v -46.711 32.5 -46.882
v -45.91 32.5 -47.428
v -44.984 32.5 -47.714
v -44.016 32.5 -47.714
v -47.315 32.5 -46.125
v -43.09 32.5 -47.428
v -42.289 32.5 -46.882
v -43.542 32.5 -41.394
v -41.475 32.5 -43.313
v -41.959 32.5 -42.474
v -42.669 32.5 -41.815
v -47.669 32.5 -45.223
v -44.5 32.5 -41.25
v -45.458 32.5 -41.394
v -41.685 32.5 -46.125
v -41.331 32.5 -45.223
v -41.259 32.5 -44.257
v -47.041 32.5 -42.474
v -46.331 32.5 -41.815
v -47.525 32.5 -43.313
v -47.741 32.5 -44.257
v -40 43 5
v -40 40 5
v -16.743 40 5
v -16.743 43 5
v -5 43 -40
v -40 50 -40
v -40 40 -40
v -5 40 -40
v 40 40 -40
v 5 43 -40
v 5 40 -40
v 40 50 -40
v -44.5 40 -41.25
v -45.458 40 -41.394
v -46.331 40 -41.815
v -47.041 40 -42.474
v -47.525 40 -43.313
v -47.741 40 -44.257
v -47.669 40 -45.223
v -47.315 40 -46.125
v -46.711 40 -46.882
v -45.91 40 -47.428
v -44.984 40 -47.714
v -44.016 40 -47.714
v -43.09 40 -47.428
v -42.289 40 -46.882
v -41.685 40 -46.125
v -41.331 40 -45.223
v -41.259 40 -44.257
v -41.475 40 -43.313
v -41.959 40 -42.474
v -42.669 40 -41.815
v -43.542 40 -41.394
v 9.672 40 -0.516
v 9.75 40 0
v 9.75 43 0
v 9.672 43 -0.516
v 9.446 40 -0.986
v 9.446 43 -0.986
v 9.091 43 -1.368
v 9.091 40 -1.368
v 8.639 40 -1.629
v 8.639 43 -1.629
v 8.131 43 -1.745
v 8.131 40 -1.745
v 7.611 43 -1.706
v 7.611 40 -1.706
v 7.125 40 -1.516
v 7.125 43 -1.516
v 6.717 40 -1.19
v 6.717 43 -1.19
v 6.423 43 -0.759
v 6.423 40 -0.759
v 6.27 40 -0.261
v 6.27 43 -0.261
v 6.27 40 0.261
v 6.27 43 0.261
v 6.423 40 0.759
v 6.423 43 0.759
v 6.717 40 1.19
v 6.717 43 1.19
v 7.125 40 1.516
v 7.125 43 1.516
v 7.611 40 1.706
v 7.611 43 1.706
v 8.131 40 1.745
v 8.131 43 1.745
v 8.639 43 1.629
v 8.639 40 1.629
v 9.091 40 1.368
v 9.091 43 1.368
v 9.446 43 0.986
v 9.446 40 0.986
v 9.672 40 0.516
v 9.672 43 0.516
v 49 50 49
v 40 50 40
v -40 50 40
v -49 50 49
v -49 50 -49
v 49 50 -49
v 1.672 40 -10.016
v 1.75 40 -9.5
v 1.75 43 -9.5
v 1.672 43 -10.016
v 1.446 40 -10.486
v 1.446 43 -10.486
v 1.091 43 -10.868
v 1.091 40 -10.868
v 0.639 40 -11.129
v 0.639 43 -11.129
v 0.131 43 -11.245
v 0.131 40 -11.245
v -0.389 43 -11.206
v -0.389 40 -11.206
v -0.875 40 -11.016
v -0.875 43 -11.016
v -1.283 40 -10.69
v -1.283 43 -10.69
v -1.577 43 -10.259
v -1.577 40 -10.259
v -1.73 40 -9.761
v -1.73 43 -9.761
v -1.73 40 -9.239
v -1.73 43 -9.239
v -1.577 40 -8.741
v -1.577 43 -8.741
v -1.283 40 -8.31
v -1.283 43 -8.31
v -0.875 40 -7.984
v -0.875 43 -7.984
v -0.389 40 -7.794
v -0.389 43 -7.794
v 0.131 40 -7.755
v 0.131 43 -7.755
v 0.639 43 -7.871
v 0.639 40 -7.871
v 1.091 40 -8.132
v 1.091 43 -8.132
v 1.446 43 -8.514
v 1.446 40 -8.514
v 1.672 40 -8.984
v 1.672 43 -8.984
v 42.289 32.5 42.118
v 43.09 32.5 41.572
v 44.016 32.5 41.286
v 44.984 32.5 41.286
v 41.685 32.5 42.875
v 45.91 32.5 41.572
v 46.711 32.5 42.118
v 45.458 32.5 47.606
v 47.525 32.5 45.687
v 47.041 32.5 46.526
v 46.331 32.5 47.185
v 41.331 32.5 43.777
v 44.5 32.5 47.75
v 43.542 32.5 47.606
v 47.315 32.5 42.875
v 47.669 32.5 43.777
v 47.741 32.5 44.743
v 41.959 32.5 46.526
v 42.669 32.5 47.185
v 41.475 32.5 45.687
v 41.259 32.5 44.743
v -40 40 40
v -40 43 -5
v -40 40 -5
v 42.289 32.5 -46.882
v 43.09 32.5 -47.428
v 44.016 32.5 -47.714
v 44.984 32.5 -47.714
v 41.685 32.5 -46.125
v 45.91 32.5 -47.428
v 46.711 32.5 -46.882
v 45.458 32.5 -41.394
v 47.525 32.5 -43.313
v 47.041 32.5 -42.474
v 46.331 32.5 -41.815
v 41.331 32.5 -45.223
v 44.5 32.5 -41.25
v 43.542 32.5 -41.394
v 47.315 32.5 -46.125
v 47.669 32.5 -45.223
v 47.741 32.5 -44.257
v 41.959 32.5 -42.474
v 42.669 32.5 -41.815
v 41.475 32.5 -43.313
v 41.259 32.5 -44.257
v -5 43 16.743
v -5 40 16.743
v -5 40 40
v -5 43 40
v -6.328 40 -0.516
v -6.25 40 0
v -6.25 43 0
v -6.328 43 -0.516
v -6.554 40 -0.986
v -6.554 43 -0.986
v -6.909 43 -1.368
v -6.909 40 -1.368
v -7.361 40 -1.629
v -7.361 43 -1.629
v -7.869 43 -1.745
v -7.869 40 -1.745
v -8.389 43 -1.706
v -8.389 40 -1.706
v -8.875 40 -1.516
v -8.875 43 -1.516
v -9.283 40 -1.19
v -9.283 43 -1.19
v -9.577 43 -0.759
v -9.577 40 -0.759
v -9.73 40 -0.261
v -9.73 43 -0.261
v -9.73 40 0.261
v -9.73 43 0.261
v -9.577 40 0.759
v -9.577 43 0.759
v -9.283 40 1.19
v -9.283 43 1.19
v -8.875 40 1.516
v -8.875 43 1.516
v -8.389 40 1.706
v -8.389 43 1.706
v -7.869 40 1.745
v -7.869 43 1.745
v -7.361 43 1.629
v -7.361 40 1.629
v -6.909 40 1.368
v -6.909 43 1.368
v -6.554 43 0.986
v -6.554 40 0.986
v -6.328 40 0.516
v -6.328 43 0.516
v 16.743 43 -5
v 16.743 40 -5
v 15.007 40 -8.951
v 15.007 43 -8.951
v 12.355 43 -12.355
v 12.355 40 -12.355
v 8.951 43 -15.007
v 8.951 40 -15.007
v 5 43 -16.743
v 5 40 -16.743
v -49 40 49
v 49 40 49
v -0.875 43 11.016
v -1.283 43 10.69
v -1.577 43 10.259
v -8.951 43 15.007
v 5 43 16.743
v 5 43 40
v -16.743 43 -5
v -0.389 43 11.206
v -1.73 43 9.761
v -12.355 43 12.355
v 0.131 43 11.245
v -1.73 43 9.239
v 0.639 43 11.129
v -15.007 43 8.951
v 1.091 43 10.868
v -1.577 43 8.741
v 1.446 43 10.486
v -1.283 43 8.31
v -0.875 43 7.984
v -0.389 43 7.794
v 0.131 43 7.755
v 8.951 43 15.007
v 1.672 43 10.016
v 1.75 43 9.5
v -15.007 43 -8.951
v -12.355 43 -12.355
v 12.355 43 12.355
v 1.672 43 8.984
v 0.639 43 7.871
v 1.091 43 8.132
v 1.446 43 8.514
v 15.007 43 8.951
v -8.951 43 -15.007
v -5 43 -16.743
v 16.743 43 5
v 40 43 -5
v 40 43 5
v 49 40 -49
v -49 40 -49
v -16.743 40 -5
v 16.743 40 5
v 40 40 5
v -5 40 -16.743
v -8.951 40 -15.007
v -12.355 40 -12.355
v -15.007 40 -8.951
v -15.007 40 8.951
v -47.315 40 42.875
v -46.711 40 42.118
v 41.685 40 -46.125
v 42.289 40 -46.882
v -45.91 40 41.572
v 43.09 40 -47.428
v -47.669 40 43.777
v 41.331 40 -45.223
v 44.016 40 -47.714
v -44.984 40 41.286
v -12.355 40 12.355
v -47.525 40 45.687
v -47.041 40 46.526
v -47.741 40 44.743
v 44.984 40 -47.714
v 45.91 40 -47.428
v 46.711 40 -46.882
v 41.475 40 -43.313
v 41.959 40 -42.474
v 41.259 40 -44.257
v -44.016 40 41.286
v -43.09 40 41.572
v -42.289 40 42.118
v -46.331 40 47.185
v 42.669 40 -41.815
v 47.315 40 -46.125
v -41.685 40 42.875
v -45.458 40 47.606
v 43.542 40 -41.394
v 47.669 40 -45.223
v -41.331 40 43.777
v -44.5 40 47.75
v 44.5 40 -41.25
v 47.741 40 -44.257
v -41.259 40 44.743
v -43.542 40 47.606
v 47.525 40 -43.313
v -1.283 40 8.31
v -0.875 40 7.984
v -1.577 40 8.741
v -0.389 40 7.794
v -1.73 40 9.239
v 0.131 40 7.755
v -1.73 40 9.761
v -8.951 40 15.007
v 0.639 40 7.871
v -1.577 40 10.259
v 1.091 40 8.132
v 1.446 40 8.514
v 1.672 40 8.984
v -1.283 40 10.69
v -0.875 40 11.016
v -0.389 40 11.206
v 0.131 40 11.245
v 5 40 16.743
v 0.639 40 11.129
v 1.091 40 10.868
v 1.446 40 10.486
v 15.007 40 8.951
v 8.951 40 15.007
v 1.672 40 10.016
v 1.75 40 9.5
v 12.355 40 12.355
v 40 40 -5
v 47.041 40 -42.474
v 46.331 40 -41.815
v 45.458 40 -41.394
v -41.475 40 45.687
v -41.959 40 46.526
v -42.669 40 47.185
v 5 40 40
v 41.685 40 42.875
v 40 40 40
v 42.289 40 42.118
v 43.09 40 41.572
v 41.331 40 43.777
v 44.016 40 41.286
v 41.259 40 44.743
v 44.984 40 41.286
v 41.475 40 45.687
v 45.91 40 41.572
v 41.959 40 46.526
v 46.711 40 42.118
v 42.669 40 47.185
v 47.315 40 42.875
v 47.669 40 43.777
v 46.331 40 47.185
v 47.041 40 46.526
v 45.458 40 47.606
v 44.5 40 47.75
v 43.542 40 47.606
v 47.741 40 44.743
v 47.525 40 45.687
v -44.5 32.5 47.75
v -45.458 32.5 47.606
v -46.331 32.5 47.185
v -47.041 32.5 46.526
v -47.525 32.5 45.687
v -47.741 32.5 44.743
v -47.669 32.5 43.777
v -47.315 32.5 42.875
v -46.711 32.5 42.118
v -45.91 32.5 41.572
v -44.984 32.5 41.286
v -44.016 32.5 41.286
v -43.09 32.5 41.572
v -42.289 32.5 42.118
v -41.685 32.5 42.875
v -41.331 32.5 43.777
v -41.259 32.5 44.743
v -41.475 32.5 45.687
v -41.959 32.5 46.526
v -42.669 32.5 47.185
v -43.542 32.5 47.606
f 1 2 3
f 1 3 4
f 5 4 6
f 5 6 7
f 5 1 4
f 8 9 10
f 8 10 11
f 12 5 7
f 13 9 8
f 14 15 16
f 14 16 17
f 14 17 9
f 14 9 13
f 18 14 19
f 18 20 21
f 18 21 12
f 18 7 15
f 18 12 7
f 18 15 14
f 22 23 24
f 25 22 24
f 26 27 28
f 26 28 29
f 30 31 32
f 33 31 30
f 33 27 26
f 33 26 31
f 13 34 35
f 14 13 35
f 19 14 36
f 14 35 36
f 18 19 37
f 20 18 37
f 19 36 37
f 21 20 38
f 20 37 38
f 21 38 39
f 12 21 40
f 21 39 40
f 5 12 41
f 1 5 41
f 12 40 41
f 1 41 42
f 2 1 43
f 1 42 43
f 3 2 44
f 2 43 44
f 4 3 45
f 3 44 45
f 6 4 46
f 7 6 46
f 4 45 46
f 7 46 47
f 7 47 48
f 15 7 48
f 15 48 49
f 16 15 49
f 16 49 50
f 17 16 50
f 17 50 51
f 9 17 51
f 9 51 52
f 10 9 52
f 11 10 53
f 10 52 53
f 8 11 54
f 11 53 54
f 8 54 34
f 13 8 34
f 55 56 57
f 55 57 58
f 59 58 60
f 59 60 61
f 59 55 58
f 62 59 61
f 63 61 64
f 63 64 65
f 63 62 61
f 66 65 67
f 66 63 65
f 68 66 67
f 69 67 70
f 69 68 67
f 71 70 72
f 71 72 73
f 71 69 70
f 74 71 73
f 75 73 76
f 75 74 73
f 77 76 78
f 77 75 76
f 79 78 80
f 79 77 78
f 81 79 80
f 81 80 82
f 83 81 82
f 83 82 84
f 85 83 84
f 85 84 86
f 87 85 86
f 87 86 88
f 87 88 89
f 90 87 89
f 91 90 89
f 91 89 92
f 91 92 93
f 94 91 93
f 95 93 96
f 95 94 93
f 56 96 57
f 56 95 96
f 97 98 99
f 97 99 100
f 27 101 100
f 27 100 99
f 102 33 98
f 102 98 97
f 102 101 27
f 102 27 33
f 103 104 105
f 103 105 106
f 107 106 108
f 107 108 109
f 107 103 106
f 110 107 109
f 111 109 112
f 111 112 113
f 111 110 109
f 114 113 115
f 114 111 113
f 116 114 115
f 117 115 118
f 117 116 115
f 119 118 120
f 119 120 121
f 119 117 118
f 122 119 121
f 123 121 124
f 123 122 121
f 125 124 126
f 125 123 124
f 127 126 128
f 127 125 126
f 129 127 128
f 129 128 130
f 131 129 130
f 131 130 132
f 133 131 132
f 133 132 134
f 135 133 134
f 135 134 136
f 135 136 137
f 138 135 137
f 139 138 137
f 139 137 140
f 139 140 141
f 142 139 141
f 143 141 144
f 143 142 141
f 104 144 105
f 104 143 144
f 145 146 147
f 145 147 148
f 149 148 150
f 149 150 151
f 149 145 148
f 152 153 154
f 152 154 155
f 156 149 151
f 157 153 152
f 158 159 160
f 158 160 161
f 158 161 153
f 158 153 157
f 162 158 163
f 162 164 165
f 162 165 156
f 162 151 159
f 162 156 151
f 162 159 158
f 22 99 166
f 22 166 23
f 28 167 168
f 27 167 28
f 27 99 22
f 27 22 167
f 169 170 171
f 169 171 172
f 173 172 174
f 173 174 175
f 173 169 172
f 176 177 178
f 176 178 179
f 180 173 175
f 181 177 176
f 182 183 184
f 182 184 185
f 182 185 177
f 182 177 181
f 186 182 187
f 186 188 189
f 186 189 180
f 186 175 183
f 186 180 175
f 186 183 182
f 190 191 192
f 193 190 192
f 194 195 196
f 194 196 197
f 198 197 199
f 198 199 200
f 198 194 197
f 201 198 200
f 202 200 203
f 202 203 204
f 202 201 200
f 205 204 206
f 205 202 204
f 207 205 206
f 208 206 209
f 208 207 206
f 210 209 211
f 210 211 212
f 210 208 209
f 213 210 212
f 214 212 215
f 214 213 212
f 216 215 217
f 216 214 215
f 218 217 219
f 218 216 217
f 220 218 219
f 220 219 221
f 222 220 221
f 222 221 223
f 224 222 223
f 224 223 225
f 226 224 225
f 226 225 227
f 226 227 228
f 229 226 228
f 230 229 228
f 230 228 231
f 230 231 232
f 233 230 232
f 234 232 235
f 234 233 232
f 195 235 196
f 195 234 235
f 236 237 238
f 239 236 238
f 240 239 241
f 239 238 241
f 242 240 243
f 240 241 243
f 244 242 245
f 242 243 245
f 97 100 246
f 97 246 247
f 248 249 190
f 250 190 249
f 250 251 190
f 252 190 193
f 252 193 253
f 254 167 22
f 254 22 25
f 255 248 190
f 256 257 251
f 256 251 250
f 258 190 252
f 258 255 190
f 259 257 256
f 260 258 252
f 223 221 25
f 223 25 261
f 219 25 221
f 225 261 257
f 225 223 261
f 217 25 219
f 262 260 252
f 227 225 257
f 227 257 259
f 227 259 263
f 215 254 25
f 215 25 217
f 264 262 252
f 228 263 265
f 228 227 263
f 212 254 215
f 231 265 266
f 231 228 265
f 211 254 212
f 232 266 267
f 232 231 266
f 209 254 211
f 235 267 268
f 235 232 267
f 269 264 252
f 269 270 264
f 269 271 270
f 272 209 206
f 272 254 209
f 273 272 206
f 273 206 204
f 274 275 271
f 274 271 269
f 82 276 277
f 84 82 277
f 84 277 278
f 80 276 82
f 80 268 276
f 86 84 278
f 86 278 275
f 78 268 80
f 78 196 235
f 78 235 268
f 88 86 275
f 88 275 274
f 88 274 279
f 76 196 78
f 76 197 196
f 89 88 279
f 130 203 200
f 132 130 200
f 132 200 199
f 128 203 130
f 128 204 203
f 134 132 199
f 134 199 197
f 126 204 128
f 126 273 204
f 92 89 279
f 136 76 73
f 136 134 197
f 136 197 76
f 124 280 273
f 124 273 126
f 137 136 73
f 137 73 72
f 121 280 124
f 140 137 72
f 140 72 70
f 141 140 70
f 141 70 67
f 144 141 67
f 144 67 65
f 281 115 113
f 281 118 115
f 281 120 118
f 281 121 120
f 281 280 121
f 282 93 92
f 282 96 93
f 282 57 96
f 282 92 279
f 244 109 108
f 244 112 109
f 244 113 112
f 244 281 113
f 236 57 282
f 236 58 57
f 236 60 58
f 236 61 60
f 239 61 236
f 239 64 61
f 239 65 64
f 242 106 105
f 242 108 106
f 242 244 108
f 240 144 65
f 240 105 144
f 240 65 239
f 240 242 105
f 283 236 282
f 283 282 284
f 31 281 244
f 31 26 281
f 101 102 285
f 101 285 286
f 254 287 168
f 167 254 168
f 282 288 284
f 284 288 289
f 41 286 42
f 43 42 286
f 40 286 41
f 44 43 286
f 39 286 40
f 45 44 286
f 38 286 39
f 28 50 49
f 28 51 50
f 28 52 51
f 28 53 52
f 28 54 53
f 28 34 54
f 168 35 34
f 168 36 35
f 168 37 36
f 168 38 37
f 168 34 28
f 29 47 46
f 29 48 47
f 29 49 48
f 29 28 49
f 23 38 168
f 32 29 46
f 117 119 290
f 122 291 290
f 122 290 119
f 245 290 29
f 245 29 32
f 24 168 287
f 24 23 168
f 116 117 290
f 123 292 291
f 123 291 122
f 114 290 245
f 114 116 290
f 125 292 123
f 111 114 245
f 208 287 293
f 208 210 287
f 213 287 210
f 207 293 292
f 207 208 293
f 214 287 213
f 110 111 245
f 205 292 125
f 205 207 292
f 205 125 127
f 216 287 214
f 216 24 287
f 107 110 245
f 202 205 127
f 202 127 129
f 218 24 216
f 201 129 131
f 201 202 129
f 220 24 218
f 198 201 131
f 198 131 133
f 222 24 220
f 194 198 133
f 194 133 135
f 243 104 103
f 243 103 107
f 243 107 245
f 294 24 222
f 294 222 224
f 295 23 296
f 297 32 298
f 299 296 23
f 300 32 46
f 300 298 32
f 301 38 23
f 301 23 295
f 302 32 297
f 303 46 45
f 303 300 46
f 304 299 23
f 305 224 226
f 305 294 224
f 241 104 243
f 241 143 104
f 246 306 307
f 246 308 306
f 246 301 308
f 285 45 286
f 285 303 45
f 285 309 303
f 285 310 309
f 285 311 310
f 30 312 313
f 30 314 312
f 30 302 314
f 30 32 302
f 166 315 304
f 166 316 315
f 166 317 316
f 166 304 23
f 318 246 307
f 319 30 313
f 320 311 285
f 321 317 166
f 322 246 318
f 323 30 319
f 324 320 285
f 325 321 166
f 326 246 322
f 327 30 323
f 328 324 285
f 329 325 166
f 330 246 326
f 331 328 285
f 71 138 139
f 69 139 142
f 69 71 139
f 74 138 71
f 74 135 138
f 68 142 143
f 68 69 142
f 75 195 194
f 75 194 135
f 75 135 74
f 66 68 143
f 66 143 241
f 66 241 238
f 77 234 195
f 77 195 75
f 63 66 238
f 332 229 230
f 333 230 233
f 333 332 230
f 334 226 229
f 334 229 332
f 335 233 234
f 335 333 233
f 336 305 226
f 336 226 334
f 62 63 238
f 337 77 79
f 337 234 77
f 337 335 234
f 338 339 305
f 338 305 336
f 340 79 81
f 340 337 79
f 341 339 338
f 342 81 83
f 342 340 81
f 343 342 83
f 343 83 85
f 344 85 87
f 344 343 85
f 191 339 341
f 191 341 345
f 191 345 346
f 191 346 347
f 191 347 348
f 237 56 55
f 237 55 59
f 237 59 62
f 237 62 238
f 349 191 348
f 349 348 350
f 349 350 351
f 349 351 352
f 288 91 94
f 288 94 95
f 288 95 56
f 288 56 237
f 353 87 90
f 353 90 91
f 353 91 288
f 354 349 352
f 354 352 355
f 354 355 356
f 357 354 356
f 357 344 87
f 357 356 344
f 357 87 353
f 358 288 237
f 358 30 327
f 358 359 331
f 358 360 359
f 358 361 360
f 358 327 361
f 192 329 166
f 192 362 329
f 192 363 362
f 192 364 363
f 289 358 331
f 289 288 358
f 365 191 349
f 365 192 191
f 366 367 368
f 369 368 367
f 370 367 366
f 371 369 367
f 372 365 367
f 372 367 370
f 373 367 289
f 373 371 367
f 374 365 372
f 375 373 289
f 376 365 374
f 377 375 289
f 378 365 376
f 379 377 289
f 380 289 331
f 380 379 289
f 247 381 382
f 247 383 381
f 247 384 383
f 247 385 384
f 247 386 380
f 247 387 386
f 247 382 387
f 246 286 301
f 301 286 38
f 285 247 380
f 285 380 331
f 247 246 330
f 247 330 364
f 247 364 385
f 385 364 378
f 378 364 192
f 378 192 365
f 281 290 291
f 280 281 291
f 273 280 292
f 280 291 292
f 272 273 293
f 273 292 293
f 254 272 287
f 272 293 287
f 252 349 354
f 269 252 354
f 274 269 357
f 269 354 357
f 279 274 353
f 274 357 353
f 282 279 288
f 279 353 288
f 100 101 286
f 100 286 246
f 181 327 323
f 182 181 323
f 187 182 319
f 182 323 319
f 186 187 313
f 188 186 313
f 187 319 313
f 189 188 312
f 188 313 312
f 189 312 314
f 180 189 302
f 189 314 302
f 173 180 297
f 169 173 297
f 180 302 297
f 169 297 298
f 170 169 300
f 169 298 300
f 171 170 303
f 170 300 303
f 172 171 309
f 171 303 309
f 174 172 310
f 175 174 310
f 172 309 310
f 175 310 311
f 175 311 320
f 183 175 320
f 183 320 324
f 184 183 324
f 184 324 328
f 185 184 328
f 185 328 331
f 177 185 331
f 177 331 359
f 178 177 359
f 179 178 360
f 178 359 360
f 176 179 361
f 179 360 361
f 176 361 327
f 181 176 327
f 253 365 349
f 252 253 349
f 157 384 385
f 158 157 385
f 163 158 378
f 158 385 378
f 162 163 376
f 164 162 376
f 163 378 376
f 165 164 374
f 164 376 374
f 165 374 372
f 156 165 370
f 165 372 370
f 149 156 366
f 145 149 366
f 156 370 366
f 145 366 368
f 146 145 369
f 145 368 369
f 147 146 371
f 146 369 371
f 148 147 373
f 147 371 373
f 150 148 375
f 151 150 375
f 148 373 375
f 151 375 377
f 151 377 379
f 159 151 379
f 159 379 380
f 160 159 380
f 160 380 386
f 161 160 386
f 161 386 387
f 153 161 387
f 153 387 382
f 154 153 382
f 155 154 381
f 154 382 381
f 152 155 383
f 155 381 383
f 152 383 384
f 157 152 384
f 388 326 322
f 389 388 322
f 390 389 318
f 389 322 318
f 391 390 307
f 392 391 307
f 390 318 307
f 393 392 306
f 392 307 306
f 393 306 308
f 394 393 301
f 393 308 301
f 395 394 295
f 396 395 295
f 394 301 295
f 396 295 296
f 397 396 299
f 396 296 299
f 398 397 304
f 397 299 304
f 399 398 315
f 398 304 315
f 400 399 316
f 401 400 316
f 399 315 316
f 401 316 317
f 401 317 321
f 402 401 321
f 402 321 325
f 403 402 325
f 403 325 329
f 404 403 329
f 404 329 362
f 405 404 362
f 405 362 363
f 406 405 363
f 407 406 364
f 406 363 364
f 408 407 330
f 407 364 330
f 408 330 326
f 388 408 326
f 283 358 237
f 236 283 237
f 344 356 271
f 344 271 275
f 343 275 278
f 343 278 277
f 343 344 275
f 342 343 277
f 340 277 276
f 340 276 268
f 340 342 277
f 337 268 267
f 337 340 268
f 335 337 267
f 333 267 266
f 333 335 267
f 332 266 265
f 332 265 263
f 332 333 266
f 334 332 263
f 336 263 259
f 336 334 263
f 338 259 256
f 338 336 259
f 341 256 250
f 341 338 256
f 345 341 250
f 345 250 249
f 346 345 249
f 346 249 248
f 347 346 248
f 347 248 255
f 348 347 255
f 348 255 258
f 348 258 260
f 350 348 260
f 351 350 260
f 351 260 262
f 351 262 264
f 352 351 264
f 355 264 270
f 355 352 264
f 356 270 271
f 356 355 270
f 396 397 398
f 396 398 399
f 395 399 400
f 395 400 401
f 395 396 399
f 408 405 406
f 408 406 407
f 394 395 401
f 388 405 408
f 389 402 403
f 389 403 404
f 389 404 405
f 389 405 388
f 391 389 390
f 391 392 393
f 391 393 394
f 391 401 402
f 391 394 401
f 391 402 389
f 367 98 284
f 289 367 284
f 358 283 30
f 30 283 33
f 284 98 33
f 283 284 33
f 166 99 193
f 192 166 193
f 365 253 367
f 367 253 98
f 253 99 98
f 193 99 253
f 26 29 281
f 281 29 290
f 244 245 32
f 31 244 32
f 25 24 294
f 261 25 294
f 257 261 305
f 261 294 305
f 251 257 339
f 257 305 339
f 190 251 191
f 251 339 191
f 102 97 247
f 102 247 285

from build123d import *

# Parameters (mm, degrees)
SKETCH2_R                  = 1.75
SKETCH2_W                  = 10
SKETCH2_H                  = 10
BOSS_EXTRUDE1_DEPTH        = 3
CIRPATTERN1_COUNT          = 4
CIRPATTERN2_START          = 40
CIRPATTERN2_OUTLINE_R      = 1.75
CIRPATTERN2_DEPTH          = 3
CIRPATTERN2_START_2        = -43
CIRPATTERN2_2_OUTLINE_R    = 1.75
CIRPATTERN2_2_DEPTH        = 3
CIRPATTERN2_3_OUTLINE_R    = 1.75
CIRPATTERN2_3_DEPTH        = 3
CIRPATTERN2_4_OUTLINE_R    = 1.75
CIRPATTERN2_4_DEPTH        = 3
BOSS_EXTRUDE2_DEPTH        = 50
BOSS_EXTRUDE2_DEPTH_BACK   = 50
SKETCH3_W                  = 10
SKETCH3_H                  = 10
BOSS_EXTRUDE2_2_DEPTH      = 50
BOSS_EXTRUDE2_2_DEPTH_BACK = 50
BOSS_EXTRUDE2_3_DEPTH      = 50
BOSS_EXTRUDE2_3_DEPTH_BACK = 50
BOSS_EXTRUDE2_4_DEPTH      = 50
BOSS_EXTRUDE2_4_DEPTH_BACK = 50
SKETCH4_W                  = 100
SKETCH4_H                  = 100
SKETCH4_W_2                = 80
SKETCH4_H_2                = 80
BOSS_EXTRUDE3_DEPTH        = 10
SKETCH5_W                  = 100
SKETCH5_H                  = 100
SKETCH5_W_2                = 80
SKETCH5_H_2                = 80
BOSS_EXTRUDE4_DEPTH        = 10
SKETCH7_R                  = 3.75
CUT_EXTRUDE2_DEPTH         = 10
SKETCH8_R                  = 3.75
CUT_EXTRUDE3_DEPTH         = 117.828934772
SKETCH9_R                  = 3.75
CUT_EXTRUDE4_DEPTH         = 117.828934772
SKETCH10_W                 = 100
SKETCH10_H                 = 100
CUT_EXTRUDE5_DEPTH         = 3
SKETCH11_W                 = 100
SKETCH11_H                 = 97
CUT_EXTRUDE6_DEPTH         = 1
SKETCH12_W                 = 99
SKETCH12_H                 = 97
CUT_EXTRUDE7_DEPTH         = 1
SKETCH13_W                 = 99
SKETCH13_H                 = 97
CUT_EXTRUDE8_DEPTH         = 1
SKETCH14_W                 = 98
SKETCH14_H                 = 97
CUT_EXTRUDE9_DEPTH         = 1
SKETCH16_W                 = 98
SKETCH16_H                 = 98
CUT_EXTRUDE10_DEPTH        = 112.22499719
SKETCH17_R                 = 3.25
BOSS_EXTRUDE5_DEPTH        = 7.5


# Read off the part's stored shape, not the designer's step: CirPattern2
with BuildPart() as part:
    # Sketch2 → Boss-Extrude1 (new body)
    # profile 1 of 13: a face of its own
    with BuildSketch(Plane.XY.offset(40)):
        with BuildLine():
            ThreePointArc((5, -16.74259435), (0, -17.47325), (-5, -16.74259435))
            Line((-5, -16.74259435), (-5, -50))
            Line((-5, -50), (5, -50))
            Line((5, -50), (5, -16.74259435))
        make_face()
    # profile 2 of 13: a face of its own
    with BuildSketch(Plane.XY.offset(40)):
        with BuildLine():
            Line((5, -5), (-5, -5))
            Line((-5, -5), (-5, -16.74259435))
            ThreePointArc((-5, -16.74259435), (0, -17.47325), (5, -16.74259435))
            Line((5, -16.74259435), (5, -5))
        make_face()
        with Locations((0, -9.5)):
            Circle(SKETCH2_R, mode=Mode.SUBTRACT)
    # profile 3 of 13: a face of its own
    with BuildSketch(Plane.XY.offset(40)):
        with BuildLine():
            Line((16.74259435, -5), (5, -5))
            Line((5, -5), (5, -16.74259435))
            ThreePointArc((5, -16.74259435), (12.355453564, -12.355453564), (16.74259435, -5))
        make_face()
    # profile 4 of 13: a face of its own
    with BuildSketch(Plane.XY.offset(40)):
        with BuildLine():
            Line((5, 5), (5, -5))
            Line((5, -5), (16.74259435, -5))
            ThreePointArc((16.74259435, -5), (17.289621197, -2.526551883), (17.47325, 0))
            ThreePointArc((17.47325, 0), (17.289621197, 2.526551883), (16.74259435, 5))
            Line((16.74259435, 5), (5, 5))
        make_face()
        with Locations((8, 0)):
            Circle(SKETCH2_R, mode=Mode.SUBTRACT)
    # profile 5 of 13: a face of its own
    with BuildSketch(Plane.XY.offset(40)):
        Rectangle(SKETCH2_W, SKETCH2_H)
    # profile 6 of 13: a face of its own
    with BuildSketch(Plane.XY.offset(40)):
        with BuildLine():
            Line((-5, -5), (-16.74259435, -5))
            ThreePointArc((-16.74259435, -5), (-12.355453564, -12.355453564), (-5, -16.74259435))
            Line((-5, -16.74259435), (-5, -5))
        make_face()
    # profile 7 of 13: a face of its own
    with BuildSketch(Plane.XY.offset(40)):
        with BuildLine():
            ThreePointArc((-16.74259435, 5), (-17.47325, 0), (-16.74259435, -5))
            Line((-16.74259435, -5), (-5, -5))
            Line((-5, -5), (-5, 5))
            Line((-5, 5), (-16.74259435, 5))
        make_face()
        with Locations((-8, 0)):
            Circle(SKETCH2_R, mode=Mode.SUBTRACT)
    # profile 8 of 13: a face of its own
    with BuildSketch(Plane.XY.offset(40)):
        with BuildLine():
            ThreePointArc((-5, 16.74259435), (-12.355453564, 12.355453564), (-16.74259435, 5))
            Line((-16.74259435, 5), (-5, 5))
            Line((-5, 5), (-5, 16.74259435))
        make_face()
    # profile 9 of 13: a face of its own
    with BuildSketch(Plane.XY.offset(40)):
        with BuildLine():
            Line((-5, 16.74259435), (-5, 5))
            Line((-5, 5), (5, 5))
            Line((5, 5), (5, 16.74259435))
            ThreePointArc((5, 16.74259435), (0, 17.47325), (-5, 16.74259435))
        make_face()
        with Locations((0, 9.5)):
            Circle(SKETCH2_R, mode=Mode.SUBTRACT)
    # profile 10 of 13: a face of its own
    with BuildSketch(Plane.XY.offset(40)):
        with BuildLine():
            Line((5, 16.74259435), (5, 5))
            Line((5, 5), (16.74259435, 5))
            ThreePointArc((16.74259435, 5), (12.355453564, 12.355453564), (5, 16.74259435))
        make_face()
    # profile 11 of 13: a face of its own
    with BuildSketch(Plane.XY.offset(40)):
        with BuildLine():
            ThreePointArc((17.47325, 0), (17.289621197, -2.526551883), (16.74259435, -5))
            Line((16.74259435, -5), (50, -5))
            Line((50, -5), (50, 5))
            Line((50, 5), (16.74259435, 5))
            ThreePointArc((16.74259435, 5), (17.289621197, 2.526551883), (17.47325, 0))
        make_face()
    # profile 12 of 13: a face of its own
    with BuildSketch(Plane.XY.offset(40)):
        with BuildLine():
            Line((-50, 5), (-50, -5))
            Line((-50, -5), (-16.74259435, -5))
            ThreePointArc((-16.74259435, -5), (-17.47325, 0), (-16.74259435, 5))
            Line((-16.74259435, 5), (-50, 5))
        make_face()
    # profile 13 of 13: a face of its own
    with BuildSketch(Plane.XY.offset(40)):
        with BuildLine():
            Line((-5, 50), (-5, 16.74259435))
            ThreePointArc((-5, 16.74259435), (0, 17.47325), (5, 16.74259435))
            Line((5, 16.74259435), (5, 50))
            Line((5, 50), (-5, 50))
        make_face()
    extrude(amount=BOSS_EXTRUDE1_DEPTH)


with BuildPart() as cirpattern1_1:
    # CirPattern1: pattern copy
    add(part.part.rotate(Axis((0, 0, 0), (1, 0, 0)), 1 * 360 / CIRPATTERN1_COUNT))


with BuildPart() as cirpattern1_2:
    # CirPattern1: pattern copy
    add(part.part.rotate(Axis((0, 0, 0), (1, 0, 0)), 2 * 360 / CIRPATTERN1_COUNT))


with BuildPart() as cirpattern1_3:
    # CirPattern1: pattern copy
    add(part.part.rotate(Axis((0, 0, 0), (1, 0, 0)), 3 * 360 / CIRPATTERN1_COUNT))


with BuildPart() as body_5:
    # CirPattern2 outline → CirPattern2 (new body)
    with BuildSketch(Plane.XY.offset(CIRPATTERN2_START)):
        with BuildLine():
            ThreePointArc((5, -16.74259435), (12.355453564, -12.355453564), (16.74259435, -5))
            Line((16.74259435, -5), (50, -5))
            Line((50, -5), (50, 5))
            Line((50, 5), (16.74259435, 5))
            ThreePointArc((16.74259435, 5), (12.355453564, 12.355453564), (5, 16.74259435))
            Line((5, 16.74259435), (5, 50))
            Line((5, 50), (-5, 50))
            Line((-5, 50), (-5, 16.74259435))
            ThreePointArc((-5, 16.74259435), (-12.355453564, 12.355453564), (-16.74259435, 5))
            Line((-16.74259435, 5), (-50, 5))
            Line((-50, 5), (-50, -5))
            Line((-50, -5), (-16.74259435, -5))
            ThreePointArc((-16.74259435, -5), (-12.355453564, -12.355453564), (-5, -16.74259435))
            Line((-5, -16.74259435), (-5, -50))
            Line((-5, -50), (5, -50))
            Line((5, -50), (5, -16.74259435))
        make_face()
        with Locations((0, -9.5)):
            Circle(CIRPATTERN2_OUTLINE_R, mode=Mode.SUBTRACT)
        with Locations((-8, 0)):
            Circle(CIRPATTERN2_OUTLINE_R, mode=Mode.SUBTRACT)
        with Locations((8, 0)):
            Circle(CIRPATTERN2_OUTLINE_R, mode=Mode.SUBTRACT)
        with Locations((0, 9.5)):
            Circle(CIRPATTERN2_OUTLINE_R, mode=Mode.SUBTRACT)
    extrude(amount=CIRPATTERN2_DEPTH)


with BuildPart() as body_6:
    # CirPattern2 2 outline → CirPattern2 2 (new body)
    with BuildSketch(Plane.YZ.offset(CIRPATTERN2_START_2)):
        with BuildLine():
            Line((-5, 50), (-5, 16.74259435))
            ThreePointArc((-5, 16.74259435), (-12.355453564, 12.355453564), (-16.74259435, 5))
            Line((-16.74259435, 5), (-50, 5))
            Line((-50, 5), (-50, -5))
            Line((-50, -5), (-16.74259435, -5))
            ThreePointArc((-16.74259435, -5), (-12.355453564, -12.355453564), (-5, -16.74259435))
            Line((-5, -16.74259435), (-5, -50))
            Line((-5, -50), (5, -50))
            Line((5, -50), (5, -16.74259435))
            ThreePointArc((5, -16.74259435), (12.355453564, -12.355453564), (16.74259435, -5))
            Line((16.74259435, -5), (50, -5))
            Line((50, -5), (50, 5))
            Line((50, 5), (16.74259435, 5))
            ThreePointArc((16.74259435, 5), (12.355453564, 12.355453564), (5, 16.74259435))
            Line((5, 16.74259435), (5, 50))
            Line((5, 50), (-5, 50))
        make_face()
        with Locations((0, -8)):
            Circle(CIRPATTERN2_2_OUTLINE_R, mode=Mode.SUBTRACT)
        with Locations((-9.5, 0)):
            Circle(CIRPATTERN2_2_OUTLINE_R, mode=Mode.SUBTRACT)
        with Locations((9.5, 0)):
            Circle(CIRPATTERN2_2_OUTLINE_R, mode=Mode.SUBTRACT)
        with Locations((0, 8)):
            Circle(CIRPATTERN2_2_OUTLINE_R, mode=Mode.SUBTRACT)
    extrude(amount=CIRPATTERN2_2_DEPTH)


with BuildPart() as body_7:
    # CirPattern2 3 outline → CirPattern2 3 (new body)
    with BuildSketch(Plane.YZ.offset(CIRPATTERN2_START)):
        with BuildLine():
            ThreePointArc((-16.74259435, -5), (-12.355453564, -12.355453564), (-5, -16.74259435))
            Line((-5, -16.74259435), (-5, -50))
            Line((-5, -50), (5, -50))
            Line((5, -50), (5, -16.74259435))
            ThreePointArc((5, -16.74259435), (12.355453564, -12.355453564), (16.74259435, -5))
            Line((16.74259435, -5), (50, -5))
            Line((50, -5), (50, 5))
            Line((50, 5), (16.74259435, 5))
            ThreePointArc((16.74259435, 5), (12.355453564, 12.355453564), (5, 16.74259435))
            Line((5, 16.74259435), (5, 50))
            Line((5, 50), (-5, 50))
            Line((-5, 50), (-5, 16.74259435))
            ThreePointArc((-5, 16.74259435), (-12.355453564, 12.355453564), (-16.74259435, 5))
            Line((-16.74259435, 5), (-50, 5))
            Line((-50, 5), (-50, -5))
            Line((-50, -5), (-16.74259435, -5))
        make_face()
        with Locations((0, -8)):
            Circle(CIRPATTERN2_3_OUTLINE_R, mode=Mode.SUBTRACT)
        with Locations((-9.5, 0)):
            Circle(CIRPATTERN2_3_OUTLINE_R, mode=Mode.SUBTRACT)
        with Locations((9.5, 0)):
            Circle(CIRPATTERN2_3_OUTLINE_R, mode=Mode.SUBTRACT)
        with Locations((0, 8)):
            Circle(CIRPATTERN2_3_OUTLINE_R, mode=Mode.SUBTRACT)
    extrude(amount=CIRPATTERN2_3_DEPTH)


with BuildPart() as body_8:
    # CirPattern2 4 outline → CirPattern2 4 (new body)
    with BuildSketch(Plane.XY.offset(CIRPATTERN2_START_2)):
        with BuildLine():
            Line((50, 5), (16.74259435, 5))
            ThreePointArc((16.74259435, 5), (12.355453564, 12.355453564), (5, 16.74259435))
            Line((5, 16.74259435), (5, 50))
            Line((5, 50), (-5, 50))
            Line((-5, 50), (-5, 16.74259435))
            ThreePointArc((-5, 16.74259435), (-12.355453564, 12.355453564), (-16.74259435, 5))
            Line((-16.74259435, 5), (-50, 5))
            Line((-50, 5), (-50, -5))
            Line((-50, -5), (-16.74259435, -5))
            ThreePointArc((-16.74259435, -5), (-12.355453564, -12.355453564), (-5, -16.74259435))
            Line((-5, -16.74259435), (-5, -50))
            Line((-5, -50), (5, -50))
            Line((5, -50), (5, -16.74259435))
            ThreePointArc((5, -16.74259435), (12.355453564, -12.355453564), (16.74259435, -5))
            Line((16.74259435, -5), (50, -5))
            Line((50, -5), (50, 5))
        make_face()
        with Locations((0, -9.5)):
            Circle(CIRPATTERN2_4_OUTLINE_R, mode=Mode.SUBTRACT)
        with Locations((-8, 0)):
            Circle(CIRPATTERN2_4_OUTLINE_R, mode=Mode.SUBTRACT)
        with Locations((8, 0)):
            Circle(CIRPATTERN2_4_OUTLINE_R, mode=Mode.SUBTRACT)
        with Locations((0, 9.5)):
            Circle(CIRPATTERN2_4_OUTLINE_R, mode=Mode.SUBTRACT)
    extrude(amount=CIRPATTERN2_4_DEPTH)


with BuildPart() as body_9:
    # Sketch3 → Boss-Extrude2 (new, two sides: drawn at the far end of the back side and taken through both)
    with BuildSketch(Plane(origin=(0, 0, 0), x_dir=(1, 0, 0), z_dir=(0, 1, 0)).offset(-BOSS_EXTRUDE2_DEPTH_BACK)):
        with Locations((-45, -45)):
            Rectangle(SKETCH3_W, SKETCH3_H)
    extrude(amount=BOSS_EXTRUDE2_DEPTH + BOSS_EXTRUDE2_DEPTH_BACK)


with BuildPart() as body_10:
    # Sketch3 → Boss-Extrude2 2 (new, two sides: drawn at the far end of the back side and taken through both)
    with BuildSketch(Plane(origin=(0, 0, 0), x_dir=(1, 0, 0), z_dir=(0, 1, 0)).offset(-BOSS_EXTRUDE2_2_DEPTH_BACK)):
        with Locations((45, -45)):
            Rectangle(SKETCH3_W, SKETCH3_H)
    extrude(amount=BOSS_EXTRUDE2_2_DEPTH + BOSS_EXTRUDE2_2_DEPTH_BACK)


with BuildPart() as body_11:
    # Sketch3 → Boss-Extrude2 3 (new, two sides: drawn at the far end of the back side and taken through both)
    with BuildSketch(Plane(origin=(0, 0, 0), x_dir=(1, 0, 0), z_dir=(0, 1, 0)).offset(-BOSS_EXTRUDE2_3_DEPTH_BACK)):
        with Locations((45, 45)):
            Rectangle(SKETCH3_W, SKETCH3_H)
    extrude(amount=BOSS_EXTRUDE2_3_DEPTH + BOSS_EXTRUDE2_3_DEPTH_BACK)


with BuildPart() as body_12:
    # Sketch3 → Boss-Extrude2 4 (new, two sides: drawn at the far end of the back side and taken through both)
    with BuildSketch(Plane(origin=(0, 0, 0), x_dir=(1, 0, 0), z_dir=(0, 1, 0)).offset(-BOSS_EXTRUDE2_4_DEPTH_BACK)):
        with Locations((-45, 45)):
            Rectangle(SKETCH3_W, SKETCH3_H)
    extrude(amount=BOSS_EXTRUDE2_4_DEPTH + BOSS_EXTRUDE2_4_DEPTH_BACK)


with BuildPart() as part_1:
    add(part.part)

    add(cirpattern1_1.part)  # Boss-Extrude3 merges CirPattern1_1

    add(cirpattern1_2.part)  # Boss-Extrude3 merges CirPattern1_2

    add(body_5.part)  # Boss-Extrude3 merges body 5

    add(body_6.part)  # Boss-Extrude3 merges body 6

    add(body_7.part)  # Boss-Extrude3 merges body 7

    add(body_8.part)  # Boss-Extrude3 merges body 8

    add(body_9.part)  # Boss-Extrude3 merges body 9

    add(body_10.part)  # Boss-Extrude3 merges body 10

    add(body_11.part)  # Boss-Extrude3 merges body 11

    add(body_12.part)  # Boss-Extrude3 merges body 12
    # Sketch4 → Boss-Extrude3 (add)
    with BuildSketch(Plane.XZ.offset(50)):
        Rectangle(SKETCH4_W, SKETCH4_H)
        Rectangle(SKETCH4_W_2, SKETCH4_H_2, mode=Mode.SUBTRACT)
    extrude(amount=-BOSS_EXTRUDE3_DEPTH)

    add(cirpattern1_3.part)  # Boss-Extrude4 merges CirPattern1_3
    # Sketch5 → Boss-Extrude4 (add)
    with BuildSketch(Plane(origin=(0, 50, 0), x_dir=(1, 0, 0), z_dir=(0, 1, 0))):
        Rectangle(SKETCH5_W, SKETCH5_H)
        Rectangle(SKETCH5_W_2, SKETCH5_H_2, mode=Mode.SUBTRACT)
    extrude(amount=-BOSS_EXTRUDE4_DEPTH)

    # Sketch7 → Cut-Extrude2 (cut)
    with BuildSketch(Plane.XZ.offset(43)):
        with Locations(Location((0, 0, 0), (0, 0, 270))):
            Circle(SKETCH7_R)
    extrude(amount=-CUT_EXTRUDE2_DEPTH, mode=Mode.SUBTRACT)

    # Sketch8 → Cut-Extrude3 (cut, through all)
    with BuildSketch(Plane.ZY.offset(43)):
        Circle(SKETCH8_R)
    extrude(amount=-CUT_EXTRUDE3_DEPTH, mode=Mode.SUBTRACT)

    # Sketch9 → Cut-Extrude4 (cut, through all)
    with BuildSketch(Plane(origin=(0, 0, -43), x_dir=(-1, 0, 0), z_dir=(0, 0, -1))):
        Circle(SKETCH9_R)
    extrude(amount=-CUT_EXTRUDE4_DEPTH, mode=Mode.SUBTRACT)

    # Sketch10 → Cut-Extrude5 (cut)
    with BuildSketch(Plane.XZ.offset(50)):
        Rectangle(SKETCH10_W, SKETCH10_H)
    extrude(amount=-CUT_EXTRUDE5_DEPTH, mode=Mode.SUBTRACT)

    # Sketch11 → Cut-Extrude6 (cut)
    with BuildSketch(Plane.ZY.offset(50)):
        with Locations((0, 1.5)):
            Rectangle(SKETCH11_W, SKETCH11_H)
    extrude(amount=-CUT_EXTRUDE6_DEPTH, mode=Mode.SUBTRACT)

    # Sketch12 → Cut-Extrude7 (cut)
    with BuildSketch(Plane.XY.offset(50)):
        with Locations((0.5, 1.5)):
            Rectangle(SKETCH12_W, SKETCH12_H)
    extrude(amount=-CUT_EXTRUDE7_DEPTH, mode=Mode.SUBTRACT)

    # Sketch13 → Cut-Extrude8 (cut)
    with BuildSketch(Plane(origin=(50, 0, 0), x_dir=(0, 0, -1), z_dir=(1, 0, 0))):
        with Locations((0.5, 1.5)):
            Rectangle(SKETCH13_W, SKETCH13_H)
    extrude(amount=-CUT_EXTRUDE8_DEPTH, mode=Mode.SUBTRACT)

    # Sketch14 → Cut-Extrude9 (cut)
    with BuildSketch(Plane(origin=(0, 0, -50), x_dir=(-1, 0, 0), z_dir=(0, 0, -1))):
        with Locations((0, 1.5)):
            Rectangle(SKETCH14_W, SKETCH14_H)
    extrude(amount=-CUT_EXTRUDE9_DEPTH, mode=Mode.SUBTRACT)

    # Sketch16 → Cut-Extrude10 (cut, through all)
    with BuildSketch(Plane.XZ.offset(-40)):
        Rectangle(SKETCH16_W, SKETCH16_H)
    extrude(amount=CUT_EXTRUDE10_DEPTH, mode=Mode.SUBTRACT)

    # Sketch17 → Boss-Extrude5 (add)
    with BuildSketch(Plane.XZ.offset(-40)):
        with Locations(Location((44.5, -44.5, 0), (0, 0, 90))):
            Circle(SKETCH17_R)
        with Locations(Location((-44.5, -44.5, 0), (0, 0, 90))):
            Circle(SKETCH17_R)
        with Locations(Location((-44.5, 44.5, 0), (0, 0, 90))):
            Circle(SKETCH17_R)
        with Locations(Location((44.5, 44.5, 0), (0, 0, 90))):
            Circle(SKETCH17_R)
    extrude(amount=BOSS_EXTRUDE5_DEPTH)


solid = part_1.part
